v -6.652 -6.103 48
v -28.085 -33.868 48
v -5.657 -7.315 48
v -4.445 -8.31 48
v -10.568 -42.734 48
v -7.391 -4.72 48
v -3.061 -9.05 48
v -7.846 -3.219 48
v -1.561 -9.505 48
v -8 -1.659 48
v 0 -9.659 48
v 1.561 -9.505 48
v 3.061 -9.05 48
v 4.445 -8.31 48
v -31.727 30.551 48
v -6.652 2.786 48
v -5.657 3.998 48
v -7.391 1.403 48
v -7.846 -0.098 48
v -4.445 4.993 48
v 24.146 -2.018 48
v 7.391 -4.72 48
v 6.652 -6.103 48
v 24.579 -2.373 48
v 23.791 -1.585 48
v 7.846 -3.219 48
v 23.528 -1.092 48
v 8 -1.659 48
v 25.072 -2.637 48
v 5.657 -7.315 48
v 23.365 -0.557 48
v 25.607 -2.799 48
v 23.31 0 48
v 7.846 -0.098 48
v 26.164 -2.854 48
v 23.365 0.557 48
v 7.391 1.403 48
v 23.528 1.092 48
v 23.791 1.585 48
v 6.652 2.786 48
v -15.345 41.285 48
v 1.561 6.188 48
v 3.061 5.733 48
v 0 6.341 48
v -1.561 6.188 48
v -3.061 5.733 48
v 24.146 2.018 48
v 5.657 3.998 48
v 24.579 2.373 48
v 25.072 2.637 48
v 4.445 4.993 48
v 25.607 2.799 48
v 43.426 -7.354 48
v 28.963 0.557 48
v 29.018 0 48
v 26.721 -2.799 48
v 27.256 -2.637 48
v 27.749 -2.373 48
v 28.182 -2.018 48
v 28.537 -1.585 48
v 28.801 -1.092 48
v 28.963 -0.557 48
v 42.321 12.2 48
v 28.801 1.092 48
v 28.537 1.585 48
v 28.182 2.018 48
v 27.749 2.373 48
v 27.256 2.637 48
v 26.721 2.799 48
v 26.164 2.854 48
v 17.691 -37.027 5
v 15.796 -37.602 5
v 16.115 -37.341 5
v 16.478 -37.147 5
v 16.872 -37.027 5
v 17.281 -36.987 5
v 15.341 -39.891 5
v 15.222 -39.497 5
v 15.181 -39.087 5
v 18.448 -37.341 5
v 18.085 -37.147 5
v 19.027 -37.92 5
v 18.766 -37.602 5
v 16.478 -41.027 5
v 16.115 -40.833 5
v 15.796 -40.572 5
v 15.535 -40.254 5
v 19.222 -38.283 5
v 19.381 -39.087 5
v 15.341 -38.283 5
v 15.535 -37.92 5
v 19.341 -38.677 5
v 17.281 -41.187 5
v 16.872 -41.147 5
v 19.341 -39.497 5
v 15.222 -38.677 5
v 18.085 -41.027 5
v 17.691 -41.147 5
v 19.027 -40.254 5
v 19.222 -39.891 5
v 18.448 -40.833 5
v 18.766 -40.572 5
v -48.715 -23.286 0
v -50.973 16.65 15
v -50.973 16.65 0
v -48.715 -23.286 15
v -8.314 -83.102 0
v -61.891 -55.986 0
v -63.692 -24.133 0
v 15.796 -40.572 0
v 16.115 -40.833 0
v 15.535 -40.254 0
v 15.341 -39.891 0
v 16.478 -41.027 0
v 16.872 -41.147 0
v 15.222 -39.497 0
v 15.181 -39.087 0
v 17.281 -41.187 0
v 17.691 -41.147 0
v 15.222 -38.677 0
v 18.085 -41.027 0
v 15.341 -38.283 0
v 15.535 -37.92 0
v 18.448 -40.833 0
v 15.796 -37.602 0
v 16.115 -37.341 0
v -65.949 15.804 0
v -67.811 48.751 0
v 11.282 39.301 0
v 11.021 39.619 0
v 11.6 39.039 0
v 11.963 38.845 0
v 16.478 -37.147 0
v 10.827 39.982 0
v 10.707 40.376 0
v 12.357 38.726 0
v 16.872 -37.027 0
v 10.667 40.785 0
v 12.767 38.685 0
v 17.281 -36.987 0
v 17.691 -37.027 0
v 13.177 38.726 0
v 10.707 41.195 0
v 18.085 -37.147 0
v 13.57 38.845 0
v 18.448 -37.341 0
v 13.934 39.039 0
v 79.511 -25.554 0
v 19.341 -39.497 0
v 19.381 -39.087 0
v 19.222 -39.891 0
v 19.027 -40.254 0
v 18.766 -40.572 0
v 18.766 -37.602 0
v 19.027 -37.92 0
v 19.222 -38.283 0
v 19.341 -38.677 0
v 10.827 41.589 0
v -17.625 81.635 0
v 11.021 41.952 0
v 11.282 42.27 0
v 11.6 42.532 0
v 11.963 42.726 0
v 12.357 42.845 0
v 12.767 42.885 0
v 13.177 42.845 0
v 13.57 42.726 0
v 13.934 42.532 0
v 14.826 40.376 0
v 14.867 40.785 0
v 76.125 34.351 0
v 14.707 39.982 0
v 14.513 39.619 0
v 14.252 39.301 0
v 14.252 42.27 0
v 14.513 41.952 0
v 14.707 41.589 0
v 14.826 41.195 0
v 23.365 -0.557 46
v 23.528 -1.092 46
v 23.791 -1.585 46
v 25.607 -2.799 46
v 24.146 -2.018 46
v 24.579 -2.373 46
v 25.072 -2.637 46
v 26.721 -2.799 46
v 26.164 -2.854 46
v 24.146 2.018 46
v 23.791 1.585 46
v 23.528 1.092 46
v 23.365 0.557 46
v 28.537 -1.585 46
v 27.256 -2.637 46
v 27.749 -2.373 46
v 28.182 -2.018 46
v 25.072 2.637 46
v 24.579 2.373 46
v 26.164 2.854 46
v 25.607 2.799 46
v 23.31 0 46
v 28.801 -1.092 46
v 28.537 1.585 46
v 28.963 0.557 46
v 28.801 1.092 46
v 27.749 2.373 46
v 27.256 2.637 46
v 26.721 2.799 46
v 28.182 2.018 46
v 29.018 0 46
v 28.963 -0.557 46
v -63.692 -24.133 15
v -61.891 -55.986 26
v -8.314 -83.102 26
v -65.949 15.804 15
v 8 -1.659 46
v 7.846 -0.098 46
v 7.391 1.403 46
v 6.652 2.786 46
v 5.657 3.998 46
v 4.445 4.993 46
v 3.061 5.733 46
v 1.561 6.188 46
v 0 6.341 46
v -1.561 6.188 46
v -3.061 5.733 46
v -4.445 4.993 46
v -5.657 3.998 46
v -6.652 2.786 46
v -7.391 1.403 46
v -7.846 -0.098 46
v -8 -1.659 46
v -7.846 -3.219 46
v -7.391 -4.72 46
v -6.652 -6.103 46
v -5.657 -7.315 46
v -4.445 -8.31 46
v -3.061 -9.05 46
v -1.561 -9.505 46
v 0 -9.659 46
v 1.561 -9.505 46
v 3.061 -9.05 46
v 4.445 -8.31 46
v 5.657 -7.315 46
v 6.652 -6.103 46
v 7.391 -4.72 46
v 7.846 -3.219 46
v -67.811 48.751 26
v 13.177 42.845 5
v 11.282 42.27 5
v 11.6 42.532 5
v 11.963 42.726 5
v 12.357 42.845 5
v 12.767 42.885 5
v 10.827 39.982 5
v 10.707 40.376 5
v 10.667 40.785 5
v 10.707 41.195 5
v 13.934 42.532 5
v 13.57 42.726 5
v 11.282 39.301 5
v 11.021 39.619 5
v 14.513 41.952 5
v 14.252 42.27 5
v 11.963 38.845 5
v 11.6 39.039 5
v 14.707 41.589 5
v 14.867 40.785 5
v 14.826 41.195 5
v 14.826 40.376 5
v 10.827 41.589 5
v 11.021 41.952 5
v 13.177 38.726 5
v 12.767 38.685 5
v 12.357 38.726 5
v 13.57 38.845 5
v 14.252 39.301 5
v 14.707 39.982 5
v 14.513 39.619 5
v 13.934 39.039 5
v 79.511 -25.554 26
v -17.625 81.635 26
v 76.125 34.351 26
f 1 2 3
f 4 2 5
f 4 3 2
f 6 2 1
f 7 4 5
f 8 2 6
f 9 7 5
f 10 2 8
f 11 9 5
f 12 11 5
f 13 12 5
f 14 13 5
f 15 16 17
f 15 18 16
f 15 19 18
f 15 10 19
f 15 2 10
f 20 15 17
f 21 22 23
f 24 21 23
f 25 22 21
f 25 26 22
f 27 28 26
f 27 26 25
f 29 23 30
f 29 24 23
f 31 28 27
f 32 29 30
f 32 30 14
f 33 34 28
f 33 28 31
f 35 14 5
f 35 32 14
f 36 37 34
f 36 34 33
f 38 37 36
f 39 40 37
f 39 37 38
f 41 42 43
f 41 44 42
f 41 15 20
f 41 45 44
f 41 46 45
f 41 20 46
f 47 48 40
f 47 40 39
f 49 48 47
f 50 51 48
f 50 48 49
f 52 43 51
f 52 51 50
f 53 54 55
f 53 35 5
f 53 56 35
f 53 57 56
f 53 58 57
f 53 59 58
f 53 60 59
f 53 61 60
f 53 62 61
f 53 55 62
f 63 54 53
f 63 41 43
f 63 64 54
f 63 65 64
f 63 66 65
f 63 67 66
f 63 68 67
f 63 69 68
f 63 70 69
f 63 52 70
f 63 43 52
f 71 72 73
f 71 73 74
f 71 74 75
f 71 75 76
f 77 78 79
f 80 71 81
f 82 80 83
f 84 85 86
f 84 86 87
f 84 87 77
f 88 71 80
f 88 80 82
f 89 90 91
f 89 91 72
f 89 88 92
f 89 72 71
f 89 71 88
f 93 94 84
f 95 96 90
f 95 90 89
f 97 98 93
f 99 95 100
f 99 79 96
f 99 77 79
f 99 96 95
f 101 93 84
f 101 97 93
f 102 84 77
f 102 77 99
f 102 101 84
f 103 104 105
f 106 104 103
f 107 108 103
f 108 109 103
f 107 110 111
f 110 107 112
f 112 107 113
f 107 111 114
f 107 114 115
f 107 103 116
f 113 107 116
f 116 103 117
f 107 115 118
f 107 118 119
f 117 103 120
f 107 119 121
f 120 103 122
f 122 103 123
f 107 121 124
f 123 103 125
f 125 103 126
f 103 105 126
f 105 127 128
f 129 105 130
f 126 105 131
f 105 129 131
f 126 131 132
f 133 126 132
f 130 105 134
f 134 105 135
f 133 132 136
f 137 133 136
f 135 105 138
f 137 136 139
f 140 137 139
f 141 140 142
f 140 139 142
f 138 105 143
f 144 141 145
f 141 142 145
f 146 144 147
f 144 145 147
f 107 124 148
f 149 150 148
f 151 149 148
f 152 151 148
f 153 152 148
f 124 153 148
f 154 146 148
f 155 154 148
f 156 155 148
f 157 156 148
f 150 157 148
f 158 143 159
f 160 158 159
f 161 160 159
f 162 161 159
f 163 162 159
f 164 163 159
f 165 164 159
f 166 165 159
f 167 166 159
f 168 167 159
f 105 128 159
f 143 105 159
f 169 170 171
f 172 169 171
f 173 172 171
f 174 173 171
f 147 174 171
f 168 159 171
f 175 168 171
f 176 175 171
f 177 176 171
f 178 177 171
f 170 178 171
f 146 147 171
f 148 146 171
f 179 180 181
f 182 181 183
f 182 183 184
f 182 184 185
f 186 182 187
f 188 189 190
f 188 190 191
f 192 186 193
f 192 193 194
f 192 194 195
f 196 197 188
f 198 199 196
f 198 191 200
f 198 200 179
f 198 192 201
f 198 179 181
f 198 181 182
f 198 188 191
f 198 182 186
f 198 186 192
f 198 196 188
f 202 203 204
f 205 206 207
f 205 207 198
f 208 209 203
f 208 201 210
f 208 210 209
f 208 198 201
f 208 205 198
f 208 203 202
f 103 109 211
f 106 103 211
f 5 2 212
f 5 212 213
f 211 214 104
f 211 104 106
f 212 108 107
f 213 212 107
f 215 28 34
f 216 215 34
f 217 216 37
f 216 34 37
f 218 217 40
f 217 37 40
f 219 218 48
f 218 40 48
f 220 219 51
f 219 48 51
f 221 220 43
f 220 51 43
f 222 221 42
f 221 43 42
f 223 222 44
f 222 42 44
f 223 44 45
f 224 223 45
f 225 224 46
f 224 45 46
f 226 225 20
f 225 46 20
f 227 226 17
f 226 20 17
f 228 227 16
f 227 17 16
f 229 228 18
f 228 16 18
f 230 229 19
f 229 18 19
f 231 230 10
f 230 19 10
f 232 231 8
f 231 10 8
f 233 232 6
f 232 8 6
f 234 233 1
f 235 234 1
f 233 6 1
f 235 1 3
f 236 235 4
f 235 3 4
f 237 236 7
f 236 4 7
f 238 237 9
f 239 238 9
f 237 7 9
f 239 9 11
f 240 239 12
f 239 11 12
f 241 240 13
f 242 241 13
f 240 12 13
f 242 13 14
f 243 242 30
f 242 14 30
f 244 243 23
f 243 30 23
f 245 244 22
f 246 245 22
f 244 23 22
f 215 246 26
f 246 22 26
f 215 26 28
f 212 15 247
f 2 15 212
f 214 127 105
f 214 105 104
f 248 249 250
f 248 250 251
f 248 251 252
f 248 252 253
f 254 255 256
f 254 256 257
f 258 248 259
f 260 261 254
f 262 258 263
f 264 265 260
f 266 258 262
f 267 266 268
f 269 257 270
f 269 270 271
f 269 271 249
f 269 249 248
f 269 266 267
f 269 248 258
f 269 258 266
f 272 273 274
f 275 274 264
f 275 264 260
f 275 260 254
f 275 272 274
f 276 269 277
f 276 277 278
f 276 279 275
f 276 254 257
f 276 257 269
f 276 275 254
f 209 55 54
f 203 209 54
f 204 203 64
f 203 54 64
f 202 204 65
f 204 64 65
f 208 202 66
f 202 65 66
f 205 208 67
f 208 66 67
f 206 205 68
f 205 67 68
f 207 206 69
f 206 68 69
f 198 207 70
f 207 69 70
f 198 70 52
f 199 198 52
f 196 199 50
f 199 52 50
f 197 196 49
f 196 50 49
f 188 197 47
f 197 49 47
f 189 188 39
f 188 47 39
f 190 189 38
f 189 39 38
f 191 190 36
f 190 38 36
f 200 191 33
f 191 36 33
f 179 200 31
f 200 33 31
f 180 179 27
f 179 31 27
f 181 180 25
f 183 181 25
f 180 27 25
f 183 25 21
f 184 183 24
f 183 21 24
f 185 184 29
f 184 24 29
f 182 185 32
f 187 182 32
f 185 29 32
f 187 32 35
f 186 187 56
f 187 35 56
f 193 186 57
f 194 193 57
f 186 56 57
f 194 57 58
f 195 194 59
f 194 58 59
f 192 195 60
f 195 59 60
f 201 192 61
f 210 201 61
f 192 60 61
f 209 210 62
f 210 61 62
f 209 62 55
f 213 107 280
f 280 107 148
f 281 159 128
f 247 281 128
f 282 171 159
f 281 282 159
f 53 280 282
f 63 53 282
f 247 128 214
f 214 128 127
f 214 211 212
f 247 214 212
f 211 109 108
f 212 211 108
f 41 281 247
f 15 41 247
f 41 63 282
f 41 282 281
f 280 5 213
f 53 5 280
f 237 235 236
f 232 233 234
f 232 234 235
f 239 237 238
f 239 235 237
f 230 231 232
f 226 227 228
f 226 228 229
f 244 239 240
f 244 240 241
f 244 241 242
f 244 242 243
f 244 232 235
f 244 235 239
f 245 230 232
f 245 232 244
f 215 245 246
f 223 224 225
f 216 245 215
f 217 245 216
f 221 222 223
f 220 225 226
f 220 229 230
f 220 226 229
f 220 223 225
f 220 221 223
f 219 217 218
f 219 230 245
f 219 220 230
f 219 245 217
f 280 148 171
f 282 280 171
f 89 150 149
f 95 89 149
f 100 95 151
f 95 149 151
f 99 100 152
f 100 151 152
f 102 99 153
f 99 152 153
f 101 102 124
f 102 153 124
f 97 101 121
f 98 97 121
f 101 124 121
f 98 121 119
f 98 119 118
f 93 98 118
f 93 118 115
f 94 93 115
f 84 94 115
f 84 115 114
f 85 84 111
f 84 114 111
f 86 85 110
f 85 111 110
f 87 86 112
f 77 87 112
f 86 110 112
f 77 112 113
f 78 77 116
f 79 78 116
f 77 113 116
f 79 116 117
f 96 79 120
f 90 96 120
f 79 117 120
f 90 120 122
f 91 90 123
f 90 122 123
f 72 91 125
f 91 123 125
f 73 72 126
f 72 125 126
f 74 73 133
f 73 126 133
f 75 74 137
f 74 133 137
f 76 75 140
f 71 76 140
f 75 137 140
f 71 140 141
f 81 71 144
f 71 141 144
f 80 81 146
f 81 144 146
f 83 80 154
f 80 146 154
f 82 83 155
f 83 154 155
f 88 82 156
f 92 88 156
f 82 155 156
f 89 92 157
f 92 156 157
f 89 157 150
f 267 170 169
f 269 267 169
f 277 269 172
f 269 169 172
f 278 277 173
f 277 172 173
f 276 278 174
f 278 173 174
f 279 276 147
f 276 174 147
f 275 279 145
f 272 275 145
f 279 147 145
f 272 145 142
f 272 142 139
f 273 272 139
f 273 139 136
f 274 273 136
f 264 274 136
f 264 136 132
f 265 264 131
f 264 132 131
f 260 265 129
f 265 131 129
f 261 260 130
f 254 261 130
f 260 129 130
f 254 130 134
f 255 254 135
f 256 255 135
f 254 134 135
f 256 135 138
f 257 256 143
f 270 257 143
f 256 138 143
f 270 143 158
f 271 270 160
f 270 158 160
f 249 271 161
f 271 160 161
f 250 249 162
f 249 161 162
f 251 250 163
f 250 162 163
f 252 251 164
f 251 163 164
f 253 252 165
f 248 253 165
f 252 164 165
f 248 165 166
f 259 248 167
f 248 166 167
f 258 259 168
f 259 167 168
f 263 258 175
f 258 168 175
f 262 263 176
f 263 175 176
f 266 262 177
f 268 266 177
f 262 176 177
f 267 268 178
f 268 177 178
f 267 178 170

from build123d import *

# Parameters (mm, degrees)
F1_DEPTH  = 48
F2_SIZE2  = 35
F2_SIZE   = 22
F3_R      = 8
F4_DEPTH  = 2
F5_R      = 2.1
F6_DEPTH  = 5
F7_W      = 40
F7_H      = 15
F8_DEPTH  = 15
F9_R      = 2.8537362448
F10_DEPTH = 2


with BuildPart() as f1:
    # F0 (on Top) → F1 (new body)
    with BuildSketch(Plane.XY):
        Polygon((-8.3140695912, -83.1016019511), (79.5110319718, -25.5537823968), (76.1251331804, 34.3506055007), (-17.6252912675, 81.6354647671), (-67.8110635892, 48.7509964503), (-61.8911448644, -55.9860702678), align=None)
    extrude(amount=F1_DEPTH)

    # F2
    f2_edges = [f1.edges().sort_by_distance(p)[0] for p in [
        (-35.102607, -69.543836, 48),
        (35.598481, -54.327692, 48),
        (77.818083, 4.398412, 48),
        (29.249921, 57.993035, 48),
        (-42.718177, 65.193231, 48),
        (-64.851104, -3.617537, 48),
    ]]
    chamfer(f2_edges, length=F2_SIZE, length2=F2_SIZE2)

    # F3 (on face) → F4 (cut)
    with BuildSketch(Plane.XY.offset(48)):
        with Locations((0, -1.6585105106)):
            Circle(F3_R)
    extrude(amount=-F4_DEPTH, mode=Mode.SUBTRACT)

    # F5 (on face) → F6 (cut)
    with BuildSketch(Plane(origin=(0, 0, 0), x_dir=(1, 0, 0), z_dir=(0, 0, -1))):
        with Locations((17.2813809108, 39.0870698365)):
            Circle(F5_R)
        with Locations((12.766849189, -40.7854473602)):
            Circle(F5_R)
    extrude(amount=-F6_DEPTH, mode=Mode.SUBTRACT)

    # F7 (on face) → F8 (cut)
    with BuildSketch(Plane(origin=(-64.8484021467, -3.66534296, 0), x_dir=(0.0564316465, -0.998406465, 0), z_dir=(-0.998406465, -0.0564316465, 0))):
        with Locations((0.5, 7.5)):
            Rectangle(F7_W, F7_H)
    extrude(amount=-F8_DEPTH, mode=Mode.SUBTRACT)

    # F9 (on face) → F10 (cut)
    with BuildSketch(Plane.XY.offset(48)):
        with Locations((26.1640120298, 0)):
            Circle(F9_R)
    extrude(amount=-F10_DEPTH, mode=Mode.SUBTRACT)


solid = f1.part
